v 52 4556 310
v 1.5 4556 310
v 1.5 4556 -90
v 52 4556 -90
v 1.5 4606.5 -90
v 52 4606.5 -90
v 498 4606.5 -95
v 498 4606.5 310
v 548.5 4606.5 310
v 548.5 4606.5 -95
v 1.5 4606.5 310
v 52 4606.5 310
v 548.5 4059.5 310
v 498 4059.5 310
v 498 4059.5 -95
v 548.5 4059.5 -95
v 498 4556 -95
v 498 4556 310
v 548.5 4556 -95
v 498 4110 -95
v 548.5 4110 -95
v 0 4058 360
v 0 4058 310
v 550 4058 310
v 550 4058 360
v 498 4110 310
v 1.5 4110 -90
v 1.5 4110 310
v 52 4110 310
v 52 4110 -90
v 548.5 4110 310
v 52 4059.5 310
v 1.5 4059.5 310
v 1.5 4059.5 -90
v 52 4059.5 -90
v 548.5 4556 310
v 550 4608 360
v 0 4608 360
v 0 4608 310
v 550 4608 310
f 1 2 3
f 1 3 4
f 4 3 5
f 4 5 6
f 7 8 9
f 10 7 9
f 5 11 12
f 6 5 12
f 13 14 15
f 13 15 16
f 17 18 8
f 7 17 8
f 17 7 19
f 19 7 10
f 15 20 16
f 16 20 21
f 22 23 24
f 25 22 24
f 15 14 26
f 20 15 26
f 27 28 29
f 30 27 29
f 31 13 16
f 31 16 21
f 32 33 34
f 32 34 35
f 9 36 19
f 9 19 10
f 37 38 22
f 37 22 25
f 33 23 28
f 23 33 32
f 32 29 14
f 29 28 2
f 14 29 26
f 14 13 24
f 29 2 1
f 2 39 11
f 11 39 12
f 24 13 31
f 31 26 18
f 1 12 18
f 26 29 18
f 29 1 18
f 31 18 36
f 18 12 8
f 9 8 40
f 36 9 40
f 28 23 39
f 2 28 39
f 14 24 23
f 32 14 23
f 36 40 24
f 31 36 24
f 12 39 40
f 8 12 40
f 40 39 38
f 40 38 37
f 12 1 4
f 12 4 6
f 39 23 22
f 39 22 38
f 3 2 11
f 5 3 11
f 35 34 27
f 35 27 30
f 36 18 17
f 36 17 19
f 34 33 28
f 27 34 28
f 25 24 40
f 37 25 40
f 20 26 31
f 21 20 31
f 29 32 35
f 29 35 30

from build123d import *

# Parameters (mm, degrees)
BOX011_W     = 50.5
BOX011_H     = 50.5
BOX011_DEPTH = 405
BOX012_W     = 50.5
BOX012_H     = 50.5
BOX012_DEPTH = 405
BOX013_W     = 50.5
BOX013_H     = 50.5
BOX013_DEPTH = 405
BOX009_W     = 550
BOX009_H     = 550
BOX009_DEPTH = 50
BOX010_W     = 50.5
BOX010_H     = 50.5
BOX010_DEPTH = 405


with BuildPart() as box002:
    # Box011 → Box011 (new body)
    with BuildSketch(Plane(origin=(1.5, 498, 0), x_dir=(1, 0, 0), z_dir=(0, 0, 1))):
        with Locations((25.25, 25.25)):
            Rectangle(BOX011_W, BOX011_H)
    extrude(amount=BOX011_DEPTH)


with BuildPart() as box003:
    # Box012 → Box012 (new body)
    with BuildSketch(Plane(origin=(498, 1.5, -5), x_dir=(1, 0, 0), z_dir=(0, 0, 1))):
        with Locations((25.25, 25.25)):
            Rectangle(BOX012_W, BOX012_H)
    extrude(amount=BOX012_DEPTH)


with BuildPart() as box004:
    # Box013 → Box013 (new body)
    with BuildSketch(Plane(origin=(498, 498, -5), x_dir=(1, 0, 0), z_dir=(0, 0, 1))):
        with Locations((25.25, 25.25)):
            Rectangle(BOX013_W, BOX013_H)
    extrude(amount=BOX013_DEPTH)


with BuildPart() as box:
    # Box009 → Box009 (new body)
    with BuildSketch(Plane.XY.offset(400)):
        with Locations((275, 275)):
            Rectangle(BOX009_W, BOX009_H)
    extrude(amount=BOX009_DEPTH)


with BuildPart() as fusion:
    # Box010 → Box010 (new body)
    with BuildSketch(Plane(origin=(1.5, 1.5, 0), x_dir=(1, 0, 0), z_dir=(0, 0, 1))):
        with Locations((25.25, 25.25)):
            Rectangle(BOX010_W, BOX010_H)
    extrude(amount=BOX010_DEPTH)

    # Fusion: union Box002, Box003, Box004, Box
    add(box002.part)
    add(box003.part)
    add(box004.part)
    add(box.part)


with BuildPart() as fusion_1:
    # Fusion placement: moved
    add(fusion.part.moved(Location((0, 4058, -90))))


solid = fusion_1.part
